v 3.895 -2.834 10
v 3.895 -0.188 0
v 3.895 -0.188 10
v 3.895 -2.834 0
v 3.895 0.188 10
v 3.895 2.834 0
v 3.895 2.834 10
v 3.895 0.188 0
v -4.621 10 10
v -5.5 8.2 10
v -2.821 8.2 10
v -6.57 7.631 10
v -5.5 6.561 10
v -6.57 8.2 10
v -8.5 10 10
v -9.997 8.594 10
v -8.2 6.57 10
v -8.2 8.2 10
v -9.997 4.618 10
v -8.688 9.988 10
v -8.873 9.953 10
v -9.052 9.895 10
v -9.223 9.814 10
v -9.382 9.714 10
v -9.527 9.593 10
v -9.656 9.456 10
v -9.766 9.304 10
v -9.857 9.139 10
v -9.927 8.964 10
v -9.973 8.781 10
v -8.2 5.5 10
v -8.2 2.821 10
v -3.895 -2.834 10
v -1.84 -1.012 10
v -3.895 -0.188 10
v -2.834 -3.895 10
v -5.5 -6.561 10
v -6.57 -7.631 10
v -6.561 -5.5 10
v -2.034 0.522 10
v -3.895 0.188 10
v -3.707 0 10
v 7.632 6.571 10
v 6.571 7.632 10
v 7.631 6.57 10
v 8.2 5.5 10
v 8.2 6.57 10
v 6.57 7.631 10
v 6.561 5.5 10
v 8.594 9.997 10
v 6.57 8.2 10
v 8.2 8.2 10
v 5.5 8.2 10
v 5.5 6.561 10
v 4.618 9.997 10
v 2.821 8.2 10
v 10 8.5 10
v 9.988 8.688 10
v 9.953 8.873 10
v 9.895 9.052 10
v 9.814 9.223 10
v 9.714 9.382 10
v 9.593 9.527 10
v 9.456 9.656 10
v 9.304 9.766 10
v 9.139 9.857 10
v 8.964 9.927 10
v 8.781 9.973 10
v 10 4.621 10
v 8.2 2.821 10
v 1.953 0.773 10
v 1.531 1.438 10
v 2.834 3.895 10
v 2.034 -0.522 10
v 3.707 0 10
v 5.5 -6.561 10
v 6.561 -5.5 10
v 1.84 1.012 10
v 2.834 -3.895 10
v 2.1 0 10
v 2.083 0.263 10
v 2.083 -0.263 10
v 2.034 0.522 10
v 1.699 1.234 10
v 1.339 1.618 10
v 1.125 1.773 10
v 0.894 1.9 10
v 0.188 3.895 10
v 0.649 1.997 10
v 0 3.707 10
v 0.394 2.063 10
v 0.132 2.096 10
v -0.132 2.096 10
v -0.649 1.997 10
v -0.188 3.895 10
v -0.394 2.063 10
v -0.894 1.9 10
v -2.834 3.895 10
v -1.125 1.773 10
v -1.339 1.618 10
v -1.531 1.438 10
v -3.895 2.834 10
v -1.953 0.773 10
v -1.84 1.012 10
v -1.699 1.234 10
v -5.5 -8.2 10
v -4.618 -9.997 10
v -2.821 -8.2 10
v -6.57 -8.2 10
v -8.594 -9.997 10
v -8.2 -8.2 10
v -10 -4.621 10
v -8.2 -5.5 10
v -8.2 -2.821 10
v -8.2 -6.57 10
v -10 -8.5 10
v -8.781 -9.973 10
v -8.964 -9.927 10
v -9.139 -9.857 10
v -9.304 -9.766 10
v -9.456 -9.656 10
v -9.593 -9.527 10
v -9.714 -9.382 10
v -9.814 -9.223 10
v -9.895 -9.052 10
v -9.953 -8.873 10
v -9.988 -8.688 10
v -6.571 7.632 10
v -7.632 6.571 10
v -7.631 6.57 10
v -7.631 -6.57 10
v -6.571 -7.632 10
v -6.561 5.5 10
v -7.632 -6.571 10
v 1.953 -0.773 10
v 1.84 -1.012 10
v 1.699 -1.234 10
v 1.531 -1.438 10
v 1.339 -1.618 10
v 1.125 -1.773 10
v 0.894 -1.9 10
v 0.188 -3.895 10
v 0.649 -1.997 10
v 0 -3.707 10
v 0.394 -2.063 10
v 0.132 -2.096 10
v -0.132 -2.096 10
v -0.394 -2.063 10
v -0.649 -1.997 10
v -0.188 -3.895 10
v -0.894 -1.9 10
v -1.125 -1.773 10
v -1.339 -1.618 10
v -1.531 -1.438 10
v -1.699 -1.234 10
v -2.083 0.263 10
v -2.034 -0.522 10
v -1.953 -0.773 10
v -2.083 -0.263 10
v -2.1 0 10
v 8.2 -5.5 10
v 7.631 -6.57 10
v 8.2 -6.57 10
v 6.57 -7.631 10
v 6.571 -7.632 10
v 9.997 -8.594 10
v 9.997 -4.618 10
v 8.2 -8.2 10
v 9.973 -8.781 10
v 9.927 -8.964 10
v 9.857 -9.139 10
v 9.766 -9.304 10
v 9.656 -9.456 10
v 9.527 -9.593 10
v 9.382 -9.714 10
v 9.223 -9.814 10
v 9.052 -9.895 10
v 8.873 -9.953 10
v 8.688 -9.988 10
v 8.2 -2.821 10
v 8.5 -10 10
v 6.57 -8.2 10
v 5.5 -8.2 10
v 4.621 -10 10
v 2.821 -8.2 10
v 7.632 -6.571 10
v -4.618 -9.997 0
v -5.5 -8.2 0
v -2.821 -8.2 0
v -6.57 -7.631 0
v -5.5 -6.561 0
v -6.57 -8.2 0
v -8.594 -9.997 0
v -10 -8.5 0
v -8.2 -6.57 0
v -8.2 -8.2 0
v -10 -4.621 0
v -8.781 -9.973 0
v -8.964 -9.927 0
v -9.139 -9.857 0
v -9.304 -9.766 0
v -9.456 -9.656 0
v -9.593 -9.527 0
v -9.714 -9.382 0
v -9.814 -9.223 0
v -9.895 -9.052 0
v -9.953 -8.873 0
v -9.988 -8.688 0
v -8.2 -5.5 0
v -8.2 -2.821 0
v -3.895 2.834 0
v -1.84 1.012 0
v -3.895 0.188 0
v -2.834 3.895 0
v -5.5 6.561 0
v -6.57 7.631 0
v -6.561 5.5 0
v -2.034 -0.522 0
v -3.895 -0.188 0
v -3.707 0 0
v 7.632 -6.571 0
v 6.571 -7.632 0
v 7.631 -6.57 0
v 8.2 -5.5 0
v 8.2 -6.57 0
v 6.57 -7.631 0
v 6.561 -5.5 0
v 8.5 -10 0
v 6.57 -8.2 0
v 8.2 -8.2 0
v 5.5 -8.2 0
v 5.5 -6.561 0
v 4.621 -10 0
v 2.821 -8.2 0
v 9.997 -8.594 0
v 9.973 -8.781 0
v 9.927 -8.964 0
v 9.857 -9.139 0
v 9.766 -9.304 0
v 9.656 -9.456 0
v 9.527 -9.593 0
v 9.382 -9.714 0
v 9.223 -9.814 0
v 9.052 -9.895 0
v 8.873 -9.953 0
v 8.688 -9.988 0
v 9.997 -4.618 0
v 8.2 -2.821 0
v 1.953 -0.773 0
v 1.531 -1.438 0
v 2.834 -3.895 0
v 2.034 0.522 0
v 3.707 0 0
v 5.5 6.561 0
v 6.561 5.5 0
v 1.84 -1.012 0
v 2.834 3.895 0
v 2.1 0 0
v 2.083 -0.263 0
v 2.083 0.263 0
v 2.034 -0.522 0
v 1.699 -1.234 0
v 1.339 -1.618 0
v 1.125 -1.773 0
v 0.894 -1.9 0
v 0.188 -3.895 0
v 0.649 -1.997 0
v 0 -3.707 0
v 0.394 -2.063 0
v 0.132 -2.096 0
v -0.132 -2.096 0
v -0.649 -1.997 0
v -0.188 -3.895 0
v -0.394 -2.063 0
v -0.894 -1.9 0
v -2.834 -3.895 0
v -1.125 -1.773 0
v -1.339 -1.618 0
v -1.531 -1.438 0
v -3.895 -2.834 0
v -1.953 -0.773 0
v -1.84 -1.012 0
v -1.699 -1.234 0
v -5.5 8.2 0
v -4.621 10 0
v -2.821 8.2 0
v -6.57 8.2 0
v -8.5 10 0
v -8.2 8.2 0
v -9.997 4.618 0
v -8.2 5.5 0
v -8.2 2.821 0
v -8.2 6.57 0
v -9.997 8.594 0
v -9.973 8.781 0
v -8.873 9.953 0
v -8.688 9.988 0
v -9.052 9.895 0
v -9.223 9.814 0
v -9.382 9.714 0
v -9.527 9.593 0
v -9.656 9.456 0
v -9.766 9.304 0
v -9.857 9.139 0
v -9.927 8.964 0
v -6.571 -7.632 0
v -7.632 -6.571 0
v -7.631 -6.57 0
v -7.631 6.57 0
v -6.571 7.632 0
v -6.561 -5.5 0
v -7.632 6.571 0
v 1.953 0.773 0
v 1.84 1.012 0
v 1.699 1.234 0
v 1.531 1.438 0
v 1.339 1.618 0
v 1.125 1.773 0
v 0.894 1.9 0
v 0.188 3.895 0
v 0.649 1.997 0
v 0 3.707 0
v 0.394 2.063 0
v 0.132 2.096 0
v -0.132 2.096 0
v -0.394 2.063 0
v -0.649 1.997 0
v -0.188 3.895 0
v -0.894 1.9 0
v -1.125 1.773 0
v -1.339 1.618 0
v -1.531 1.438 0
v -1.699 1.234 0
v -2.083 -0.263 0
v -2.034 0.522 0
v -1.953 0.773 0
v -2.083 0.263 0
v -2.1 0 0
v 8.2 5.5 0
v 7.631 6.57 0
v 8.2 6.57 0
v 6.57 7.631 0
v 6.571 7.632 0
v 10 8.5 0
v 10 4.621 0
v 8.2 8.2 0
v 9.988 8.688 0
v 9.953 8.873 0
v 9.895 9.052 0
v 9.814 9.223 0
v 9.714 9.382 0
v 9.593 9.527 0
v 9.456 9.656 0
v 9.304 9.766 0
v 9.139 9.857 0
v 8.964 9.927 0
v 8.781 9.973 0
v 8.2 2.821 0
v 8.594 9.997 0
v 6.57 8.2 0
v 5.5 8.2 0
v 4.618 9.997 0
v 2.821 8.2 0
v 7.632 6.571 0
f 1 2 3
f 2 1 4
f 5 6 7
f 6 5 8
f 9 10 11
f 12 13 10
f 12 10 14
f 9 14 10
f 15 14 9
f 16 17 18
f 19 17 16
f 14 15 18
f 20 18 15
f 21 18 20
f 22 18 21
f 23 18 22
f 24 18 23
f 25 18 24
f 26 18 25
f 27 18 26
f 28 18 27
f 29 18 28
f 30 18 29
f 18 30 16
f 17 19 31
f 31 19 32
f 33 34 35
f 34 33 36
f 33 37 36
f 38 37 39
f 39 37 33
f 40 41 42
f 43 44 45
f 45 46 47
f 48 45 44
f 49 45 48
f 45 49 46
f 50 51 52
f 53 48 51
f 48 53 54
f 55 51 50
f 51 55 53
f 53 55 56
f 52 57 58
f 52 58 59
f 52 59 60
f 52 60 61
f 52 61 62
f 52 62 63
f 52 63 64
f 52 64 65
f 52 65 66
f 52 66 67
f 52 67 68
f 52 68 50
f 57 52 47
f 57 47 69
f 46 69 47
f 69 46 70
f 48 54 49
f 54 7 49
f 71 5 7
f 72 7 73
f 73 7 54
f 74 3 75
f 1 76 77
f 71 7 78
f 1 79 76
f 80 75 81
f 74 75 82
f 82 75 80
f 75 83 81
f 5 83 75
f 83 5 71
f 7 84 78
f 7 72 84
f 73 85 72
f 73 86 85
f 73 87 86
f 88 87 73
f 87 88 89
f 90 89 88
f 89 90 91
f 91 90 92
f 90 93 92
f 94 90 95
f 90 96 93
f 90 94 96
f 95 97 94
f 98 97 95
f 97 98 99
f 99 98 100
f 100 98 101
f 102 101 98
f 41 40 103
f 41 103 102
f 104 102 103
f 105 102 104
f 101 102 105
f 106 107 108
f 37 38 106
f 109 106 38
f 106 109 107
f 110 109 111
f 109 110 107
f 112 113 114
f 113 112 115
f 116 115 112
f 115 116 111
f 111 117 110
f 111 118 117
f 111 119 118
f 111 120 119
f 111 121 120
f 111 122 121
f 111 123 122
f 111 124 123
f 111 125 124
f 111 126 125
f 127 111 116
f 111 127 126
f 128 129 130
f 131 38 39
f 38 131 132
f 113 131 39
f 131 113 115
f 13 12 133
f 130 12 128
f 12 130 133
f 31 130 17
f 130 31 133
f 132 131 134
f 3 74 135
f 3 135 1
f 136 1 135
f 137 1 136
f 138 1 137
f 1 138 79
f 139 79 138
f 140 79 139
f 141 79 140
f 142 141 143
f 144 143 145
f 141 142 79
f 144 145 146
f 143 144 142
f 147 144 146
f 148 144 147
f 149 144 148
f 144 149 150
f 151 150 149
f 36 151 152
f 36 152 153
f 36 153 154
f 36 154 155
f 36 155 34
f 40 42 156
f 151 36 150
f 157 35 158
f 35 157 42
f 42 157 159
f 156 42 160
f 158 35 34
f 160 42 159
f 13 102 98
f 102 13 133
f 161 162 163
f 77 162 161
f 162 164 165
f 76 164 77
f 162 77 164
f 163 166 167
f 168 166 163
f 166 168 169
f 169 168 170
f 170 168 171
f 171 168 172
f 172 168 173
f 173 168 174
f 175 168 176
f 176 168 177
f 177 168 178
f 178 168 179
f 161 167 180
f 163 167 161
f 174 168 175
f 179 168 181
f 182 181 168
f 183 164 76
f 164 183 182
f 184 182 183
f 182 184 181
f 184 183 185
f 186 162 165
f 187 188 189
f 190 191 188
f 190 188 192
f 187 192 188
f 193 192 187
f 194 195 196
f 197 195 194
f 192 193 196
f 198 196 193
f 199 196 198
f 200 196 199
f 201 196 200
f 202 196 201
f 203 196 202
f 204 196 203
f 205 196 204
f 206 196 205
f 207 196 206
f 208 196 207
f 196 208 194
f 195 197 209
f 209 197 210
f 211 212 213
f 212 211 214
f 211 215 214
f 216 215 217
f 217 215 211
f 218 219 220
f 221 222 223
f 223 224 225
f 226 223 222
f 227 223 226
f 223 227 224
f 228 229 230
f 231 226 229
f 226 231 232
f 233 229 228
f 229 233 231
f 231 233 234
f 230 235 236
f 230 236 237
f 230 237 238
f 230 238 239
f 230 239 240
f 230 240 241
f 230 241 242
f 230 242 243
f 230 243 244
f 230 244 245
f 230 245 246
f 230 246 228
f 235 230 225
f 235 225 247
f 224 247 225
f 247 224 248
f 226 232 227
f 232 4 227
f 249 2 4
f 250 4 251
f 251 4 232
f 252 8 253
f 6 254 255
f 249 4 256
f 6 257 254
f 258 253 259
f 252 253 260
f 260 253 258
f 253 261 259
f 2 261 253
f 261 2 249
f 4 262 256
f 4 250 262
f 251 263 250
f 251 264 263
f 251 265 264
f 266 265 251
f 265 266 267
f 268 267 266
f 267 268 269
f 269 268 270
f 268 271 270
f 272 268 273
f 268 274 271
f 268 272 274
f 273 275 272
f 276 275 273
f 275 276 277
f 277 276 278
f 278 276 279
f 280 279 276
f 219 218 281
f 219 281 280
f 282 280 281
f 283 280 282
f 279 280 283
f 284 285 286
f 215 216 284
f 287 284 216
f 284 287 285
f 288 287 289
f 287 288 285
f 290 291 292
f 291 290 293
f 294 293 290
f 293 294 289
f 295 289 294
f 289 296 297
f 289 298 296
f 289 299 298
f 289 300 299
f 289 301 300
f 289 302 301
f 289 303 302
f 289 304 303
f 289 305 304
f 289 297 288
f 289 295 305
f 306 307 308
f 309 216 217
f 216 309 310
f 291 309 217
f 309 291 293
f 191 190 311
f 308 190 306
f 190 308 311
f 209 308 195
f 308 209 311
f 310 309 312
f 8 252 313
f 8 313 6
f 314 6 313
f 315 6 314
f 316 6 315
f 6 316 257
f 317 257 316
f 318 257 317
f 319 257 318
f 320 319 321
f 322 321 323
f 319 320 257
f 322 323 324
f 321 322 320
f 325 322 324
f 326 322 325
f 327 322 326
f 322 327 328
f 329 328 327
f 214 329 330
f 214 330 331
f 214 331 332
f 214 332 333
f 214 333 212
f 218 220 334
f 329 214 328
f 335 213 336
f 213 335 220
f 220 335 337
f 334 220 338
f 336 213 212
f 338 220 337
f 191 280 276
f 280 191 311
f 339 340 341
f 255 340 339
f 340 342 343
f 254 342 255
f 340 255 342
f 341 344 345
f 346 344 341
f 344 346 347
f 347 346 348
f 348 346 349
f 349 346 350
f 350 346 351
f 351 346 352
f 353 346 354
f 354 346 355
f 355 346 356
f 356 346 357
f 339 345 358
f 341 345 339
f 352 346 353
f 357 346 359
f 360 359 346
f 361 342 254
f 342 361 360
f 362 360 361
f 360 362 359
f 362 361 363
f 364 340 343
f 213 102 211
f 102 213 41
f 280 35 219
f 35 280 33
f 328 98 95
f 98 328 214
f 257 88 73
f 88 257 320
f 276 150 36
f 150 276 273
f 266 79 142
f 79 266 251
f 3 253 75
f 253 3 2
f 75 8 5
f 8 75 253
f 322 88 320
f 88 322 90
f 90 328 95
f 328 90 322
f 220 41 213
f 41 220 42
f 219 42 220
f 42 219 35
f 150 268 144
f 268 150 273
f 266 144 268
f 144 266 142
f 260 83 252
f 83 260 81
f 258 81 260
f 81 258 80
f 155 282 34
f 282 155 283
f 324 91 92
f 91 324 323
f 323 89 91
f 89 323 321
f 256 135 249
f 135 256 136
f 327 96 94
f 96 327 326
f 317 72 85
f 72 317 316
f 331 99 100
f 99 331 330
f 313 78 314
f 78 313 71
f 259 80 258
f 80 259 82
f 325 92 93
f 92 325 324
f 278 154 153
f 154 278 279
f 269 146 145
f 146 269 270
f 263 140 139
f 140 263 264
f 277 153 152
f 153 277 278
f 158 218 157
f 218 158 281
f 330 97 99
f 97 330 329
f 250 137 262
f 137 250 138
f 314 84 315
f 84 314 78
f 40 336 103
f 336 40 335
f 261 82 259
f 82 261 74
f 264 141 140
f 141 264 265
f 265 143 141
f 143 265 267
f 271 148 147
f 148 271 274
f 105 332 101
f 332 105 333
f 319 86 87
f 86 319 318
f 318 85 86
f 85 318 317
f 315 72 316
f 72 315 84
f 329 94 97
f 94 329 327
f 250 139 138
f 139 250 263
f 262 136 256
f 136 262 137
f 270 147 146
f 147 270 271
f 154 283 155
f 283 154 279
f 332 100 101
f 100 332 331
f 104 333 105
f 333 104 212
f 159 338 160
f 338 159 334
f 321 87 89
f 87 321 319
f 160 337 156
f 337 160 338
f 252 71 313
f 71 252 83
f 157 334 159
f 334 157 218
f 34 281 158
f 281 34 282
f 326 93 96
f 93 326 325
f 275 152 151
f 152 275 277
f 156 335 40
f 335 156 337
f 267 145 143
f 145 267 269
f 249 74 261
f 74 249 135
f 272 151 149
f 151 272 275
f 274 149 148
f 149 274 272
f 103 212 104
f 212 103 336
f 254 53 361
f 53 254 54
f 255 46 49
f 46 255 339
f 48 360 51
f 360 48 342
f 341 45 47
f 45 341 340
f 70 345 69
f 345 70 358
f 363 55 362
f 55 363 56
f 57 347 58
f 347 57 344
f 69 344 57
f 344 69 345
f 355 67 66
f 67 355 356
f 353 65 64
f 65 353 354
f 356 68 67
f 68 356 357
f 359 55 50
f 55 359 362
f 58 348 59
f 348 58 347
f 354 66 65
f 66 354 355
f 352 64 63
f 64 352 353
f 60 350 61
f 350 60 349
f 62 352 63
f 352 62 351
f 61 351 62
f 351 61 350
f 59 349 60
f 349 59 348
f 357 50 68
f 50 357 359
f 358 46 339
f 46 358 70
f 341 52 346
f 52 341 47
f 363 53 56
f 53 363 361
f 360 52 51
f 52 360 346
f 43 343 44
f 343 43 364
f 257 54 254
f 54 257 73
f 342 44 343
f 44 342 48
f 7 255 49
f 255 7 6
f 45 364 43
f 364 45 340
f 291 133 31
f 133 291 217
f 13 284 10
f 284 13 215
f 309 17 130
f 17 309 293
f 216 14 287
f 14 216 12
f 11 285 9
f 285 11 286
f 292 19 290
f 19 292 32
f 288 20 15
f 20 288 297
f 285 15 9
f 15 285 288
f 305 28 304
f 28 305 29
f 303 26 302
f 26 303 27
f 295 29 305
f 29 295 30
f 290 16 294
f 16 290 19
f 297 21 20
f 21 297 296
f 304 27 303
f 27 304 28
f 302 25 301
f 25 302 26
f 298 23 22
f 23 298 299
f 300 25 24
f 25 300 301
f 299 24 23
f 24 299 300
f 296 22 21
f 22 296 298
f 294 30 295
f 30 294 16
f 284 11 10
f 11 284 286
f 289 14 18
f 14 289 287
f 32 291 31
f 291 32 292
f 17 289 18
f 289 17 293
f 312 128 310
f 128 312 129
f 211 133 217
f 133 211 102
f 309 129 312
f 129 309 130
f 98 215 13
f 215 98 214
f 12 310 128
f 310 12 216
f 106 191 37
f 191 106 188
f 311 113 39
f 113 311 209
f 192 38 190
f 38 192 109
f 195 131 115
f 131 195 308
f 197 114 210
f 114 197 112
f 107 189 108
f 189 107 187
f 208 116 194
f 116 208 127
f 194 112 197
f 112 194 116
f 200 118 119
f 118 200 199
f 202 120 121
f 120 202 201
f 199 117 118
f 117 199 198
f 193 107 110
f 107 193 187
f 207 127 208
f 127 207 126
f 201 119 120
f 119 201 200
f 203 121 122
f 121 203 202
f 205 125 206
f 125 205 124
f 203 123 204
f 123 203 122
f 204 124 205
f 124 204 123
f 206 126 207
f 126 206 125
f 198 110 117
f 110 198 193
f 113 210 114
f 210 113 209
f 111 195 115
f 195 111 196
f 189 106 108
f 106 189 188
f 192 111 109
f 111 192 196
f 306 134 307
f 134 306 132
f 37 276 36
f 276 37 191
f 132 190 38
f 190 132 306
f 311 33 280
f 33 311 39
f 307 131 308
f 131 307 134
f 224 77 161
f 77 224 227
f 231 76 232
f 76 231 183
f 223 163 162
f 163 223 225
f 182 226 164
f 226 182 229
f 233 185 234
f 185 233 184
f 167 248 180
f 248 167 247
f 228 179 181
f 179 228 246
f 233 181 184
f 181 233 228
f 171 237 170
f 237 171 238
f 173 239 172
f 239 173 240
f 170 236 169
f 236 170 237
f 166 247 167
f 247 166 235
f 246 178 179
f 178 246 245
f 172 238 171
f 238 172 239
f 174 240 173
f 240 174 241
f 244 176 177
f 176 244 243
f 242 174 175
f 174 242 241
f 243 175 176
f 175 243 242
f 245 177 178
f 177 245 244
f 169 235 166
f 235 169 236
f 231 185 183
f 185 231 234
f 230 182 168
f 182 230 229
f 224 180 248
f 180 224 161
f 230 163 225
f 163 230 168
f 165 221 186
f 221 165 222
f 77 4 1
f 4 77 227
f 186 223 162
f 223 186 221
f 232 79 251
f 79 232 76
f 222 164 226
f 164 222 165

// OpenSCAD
shape="20x20";//[20x20,20x40,20x60,20x80,40x40,C-Beam]
lenght=10;

//////////////
$fn=50;
module center() {
    difference() {
        
        intersection() {
            translate([0,0,0.5]) cube([7.79,7.79,1],center=true);
            cylinder(d=13.5,h=3,center=true,$fn=4);
        }
            
        
        cylinder(d=4.2,h=3,center=true);
        for(i=[0:90:270]) rotate([0,0,i]) translate([7.2425,0,0]) rotate([0,0,45]) cube(5,center=true);
    }
}




module corner() {
    difference() {
        translate([5.5,5.5,0]) cube([3,3,1]);
        translate([5.5+1.07,5.5+1.07,-0.5]) cube([3,3,2]);
    }
    translate([3,3,0])rotate([0,0,45]) translate([0,-0.75,0]) cube([5.8,1.5,1]);
    difference() {
        hull() {for(i=[0,1],j=[0,1]) translate([i*8.5,j*8.5,0]) cylinder(d=3,h=1);}
        for(i=[0,90]) rotate([0,0,i]) translate([12.45,0,0]) rotate([0,0,45]) cube(10,center=true);
        cube(16.4,center=true);
    }
}

module raccord() {
    translate([-10,0,0]) {
        difference() {
            translate([0,8.2,0]) cube([20,1.8,1]);
            for(i=[0,20]) translate([i,12.45,0]) rotate([0,0,45]) cube(10,center=true);
        }
        translate([10,0,0]) for(i=[-1,1]) scale([i,1,1]) translate([5.39868/2,10-1.8-1.96,0]) cube([1.8,2,1]);
         for(i=[0,1]) translate([i*20,0,0]) rotate([0,0,i*90]) translate([3,3,0])rotate([0,0,45]) translate([0,-0.75,0]) cube([5.33205,1.5,1]);
    }
}

module inner_corner() {
    difference() {
        union() {
            translate([10,0,0]) raccord();
            translate([0,10,0]) rotate([0,0,-90]) raccord();
        }
        translate([0,0,-0.5]) cube([11,8.2,3]);
        translate([0,0,-0.5]) cube([8.2,11,3]);
    }
    translate([3,3,0])rotate([0,0,45]) translate([0,-0.75,0]) cube([9,1.5,1]);  
}


module V_slot(shape,lenght) {
scale([1,1,lenght]) {
    if (shape=="20x20") {
            center();
            for(i=[0:90:270]) rotate([0,0,i]) corner();
        }
        
    else if (shape=="20x40") {
            for(i=[-1,1]) translate([i*10,0,0]) center();
            for(i=[-1,1]) scale([1,i,1]) raccord();
            for(j=[-1,1]) scale([j,1,1]) translate([10,0,0]) for(i=[0,-90]) rotate([0,0,i]) corner();
        }
        
    else if (shape=="20x60") {
            for(i=[-1,0,1]) translate([i*20,0,0]) center();
            for(i=[-1,1]) scale([1,i,1]) for(i=[-1,1]) translate([i*10,0,0]) raccord();
            for(j=[-1,1]) scale([j,1,1]) translate([20,0,0]) for(i=[0,-90]) rotate([0,0,i]) corner();
        }
        
    else if (shape=="20x80") {
            for(i=[-3,-1,1,3]) translate([i*10,0,0]) center();
            for(i=[-1,1]) scale([1,i,1]) for(i=[-1,0,1]) translate([i*20,0,0]) raccord();
            for(j=[-1,1]) scale([j,1,1]) translate([30,0,0]) for(i=[0,-90]) rotate([0,0,i]) corner();
        }
        
    else if (shape=="40x40") {
            for(i=[0:90:270]) rotate([0,0,i]) {
                translate([10,10,0]) center();
                translate([0,10,0]) raccord();
                translate([10,10,0]) corner();
            }
        }
        
    else {

        for(i=[-3,-1,1,3]) translate([i*10,-10,0]) center();
        for(i=[-3,,3]) translate([i*10,10,0]) center();
            
        scale([1,-1,1]) for(i=[-1,0,1]) translate([i*20,10,0]) raccord();
        for(i=[-90,90]) rotate([0,0,i]) translate([0,30,0]) raccord();
        translate([0,-10,0]) raccord();
            
        for(j=[-1,1]) scale([j,1,1]) translate([30,-10,0]) rotate([0,0,-90]) corner();
        for(j=[-1,1]) scale([j,1,1]) translate([30,10,0]) for(i=[0,90]) rotate([0,0,i]) corner();
        
        for(j=[-1,1]) scale([j,1,1]) translate([-30,-10,0]) inner_corner();
    
    }
}

}

V_slot(shape,lenght);
